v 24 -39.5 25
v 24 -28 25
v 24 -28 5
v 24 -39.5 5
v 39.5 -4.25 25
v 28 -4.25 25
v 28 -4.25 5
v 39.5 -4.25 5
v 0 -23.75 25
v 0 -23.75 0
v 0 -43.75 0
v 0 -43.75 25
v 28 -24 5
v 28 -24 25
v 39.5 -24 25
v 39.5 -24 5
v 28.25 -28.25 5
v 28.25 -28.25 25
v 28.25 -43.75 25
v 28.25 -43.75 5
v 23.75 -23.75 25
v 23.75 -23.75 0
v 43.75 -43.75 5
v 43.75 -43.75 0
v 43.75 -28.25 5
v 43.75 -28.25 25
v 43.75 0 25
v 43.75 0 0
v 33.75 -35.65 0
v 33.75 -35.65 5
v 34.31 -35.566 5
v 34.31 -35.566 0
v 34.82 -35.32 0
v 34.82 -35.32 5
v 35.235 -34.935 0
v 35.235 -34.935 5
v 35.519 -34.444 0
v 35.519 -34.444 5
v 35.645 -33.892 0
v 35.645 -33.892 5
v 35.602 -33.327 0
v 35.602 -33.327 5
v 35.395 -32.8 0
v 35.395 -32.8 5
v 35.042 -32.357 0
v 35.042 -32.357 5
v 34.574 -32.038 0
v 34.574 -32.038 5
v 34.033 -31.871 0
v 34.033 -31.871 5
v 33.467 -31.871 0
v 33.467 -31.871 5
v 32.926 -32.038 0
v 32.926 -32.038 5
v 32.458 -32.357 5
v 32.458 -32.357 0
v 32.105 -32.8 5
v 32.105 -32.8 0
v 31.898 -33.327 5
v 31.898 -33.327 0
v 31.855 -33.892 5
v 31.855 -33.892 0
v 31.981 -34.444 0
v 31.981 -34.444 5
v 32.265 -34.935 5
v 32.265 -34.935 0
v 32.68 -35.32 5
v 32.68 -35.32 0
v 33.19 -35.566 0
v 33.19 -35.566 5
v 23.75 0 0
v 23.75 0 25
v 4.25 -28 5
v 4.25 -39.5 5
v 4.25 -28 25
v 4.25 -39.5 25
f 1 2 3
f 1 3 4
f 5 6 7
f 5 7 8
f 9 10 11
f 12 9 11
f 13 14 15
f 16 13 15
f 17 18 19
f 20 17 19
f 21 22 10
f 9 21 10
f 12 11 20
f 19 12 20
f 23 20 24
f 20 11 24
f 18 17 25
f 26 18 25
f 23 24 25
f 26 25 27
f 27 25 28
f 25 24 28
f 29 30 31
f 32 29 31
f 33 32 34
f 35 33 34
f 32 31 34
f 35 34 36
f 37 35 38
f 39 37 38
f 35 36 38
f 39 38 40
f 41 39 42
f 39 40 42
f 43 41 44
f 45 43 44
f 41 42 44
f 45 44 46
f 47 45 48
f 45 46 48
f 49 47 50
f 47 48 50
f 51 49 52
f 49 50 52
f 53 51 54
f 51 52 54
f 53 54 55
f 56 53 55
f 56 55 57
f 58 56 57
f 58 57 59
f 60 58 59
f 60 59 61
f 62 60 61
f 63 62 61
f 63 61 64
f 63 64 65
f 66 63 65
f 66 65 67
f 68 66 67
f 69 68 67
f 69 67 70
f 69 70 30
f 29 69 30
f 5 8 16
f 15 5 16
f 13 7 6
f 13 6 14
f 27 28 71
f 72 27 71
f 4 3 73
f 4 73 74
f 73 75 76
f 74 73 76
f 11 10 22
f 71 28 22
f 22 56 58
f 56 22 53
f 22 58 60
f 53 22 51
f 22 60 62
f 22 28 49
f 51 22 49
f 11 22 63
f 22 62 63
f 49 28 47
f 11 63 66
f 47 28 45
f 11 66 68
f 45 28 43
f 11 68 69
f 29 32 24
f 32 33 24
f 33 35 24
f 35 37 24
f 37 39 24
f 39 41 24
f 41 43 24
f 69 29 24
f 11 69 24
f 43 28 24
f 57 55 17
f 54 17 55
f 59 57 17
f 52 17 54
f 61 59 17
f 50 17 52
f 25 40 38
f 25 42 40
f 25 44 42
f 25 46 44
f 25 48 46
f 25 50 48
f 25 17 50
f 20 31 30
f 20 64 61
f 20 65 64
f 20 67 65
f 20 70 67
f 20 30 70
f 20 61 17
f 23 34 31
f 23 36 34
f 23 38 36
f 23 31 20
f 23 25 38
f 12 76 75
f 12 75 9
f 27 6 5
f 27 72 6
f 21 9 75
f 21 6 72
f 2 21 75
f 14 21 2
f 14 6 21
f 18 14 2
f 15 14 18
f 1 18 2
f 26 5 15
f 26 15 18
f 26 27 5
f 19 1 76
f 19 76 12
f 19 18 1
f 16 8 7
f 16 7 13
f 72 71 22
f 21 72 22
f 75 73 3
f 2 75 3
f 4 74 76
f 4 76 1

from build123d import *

# Parameters (mm, degrees)
PAD_DEPTH            = 25
SKETCH001_R          = 1.9
POCKET_DEPTH         = 25
SKETCH002_W          = 20
SKETCH002_H          = 20
POCKET001_DEPTH      = 20
SKETCH003_W          = 19.75
SKETCH003_H          = 11.5
SKETCH003_W_2        = 11.5
SKETCH003_H_2        = 19.75
POCKET002_DEPTH      = 20
BODY_PLACEMENT_ANGLE = 90


with BuildPart() as part:
    # Sketch → Pad (new body)
    with BuildSketch(Plane.XY):
        Polygon((0, 23.75), (23.75, 23.75), (23.75, 0), (43.75, 0), (43.75, 43.75), (0, 43.75), align=None)
    extrude(amount=PAD_DEPTH)

    # Sketch001 (on Face8 of Pad) → Pocket (cut)
    with BuildSketch(Plane.XY.offset(25)):
        with Locations((33.75, 33.75)):
            Circle(SKETCH001_R)
    extrude(amount=-POCKET_DEPTH, mode=Mode.SUBTRACT)

    # Sketch002 (on Face5 of Pocket) → Pocket001 (cut)
    with BuildSketch(Plane.XY.offset(25)):
        with Locations((38.25, 38.25)):
            Rectangle(SKETCH002_W, SKETCH002_H)
    extrude(amount=-POCKET001_DEPTH, mode=Mode.SUBTRACT)

    # Sketch003 (on Face5 of Pocket001) → Pocket002 (cut)
    with BuildSketch(Plane.XY.offset(25)):
        with Locations((14.125, 33.75)):
            Rectangle(SKETCH003_W, SKETCH003_H)
        with Locations((33.75, 14.125)):
            Rectangle(SKETCH003_W_2, SKETCH003_H_2)
    extrude(amount=-POCKET002_DEPTH, mode=Mode.SUBTRACT)


with BuildPart() as part_1:
    # Body placement: moved
    add(part.part.rotate(Axis((0, 0, 0), (0, 0, -1)), BODY_PLACEMENT_ANGLE))


solid = part_1.part
